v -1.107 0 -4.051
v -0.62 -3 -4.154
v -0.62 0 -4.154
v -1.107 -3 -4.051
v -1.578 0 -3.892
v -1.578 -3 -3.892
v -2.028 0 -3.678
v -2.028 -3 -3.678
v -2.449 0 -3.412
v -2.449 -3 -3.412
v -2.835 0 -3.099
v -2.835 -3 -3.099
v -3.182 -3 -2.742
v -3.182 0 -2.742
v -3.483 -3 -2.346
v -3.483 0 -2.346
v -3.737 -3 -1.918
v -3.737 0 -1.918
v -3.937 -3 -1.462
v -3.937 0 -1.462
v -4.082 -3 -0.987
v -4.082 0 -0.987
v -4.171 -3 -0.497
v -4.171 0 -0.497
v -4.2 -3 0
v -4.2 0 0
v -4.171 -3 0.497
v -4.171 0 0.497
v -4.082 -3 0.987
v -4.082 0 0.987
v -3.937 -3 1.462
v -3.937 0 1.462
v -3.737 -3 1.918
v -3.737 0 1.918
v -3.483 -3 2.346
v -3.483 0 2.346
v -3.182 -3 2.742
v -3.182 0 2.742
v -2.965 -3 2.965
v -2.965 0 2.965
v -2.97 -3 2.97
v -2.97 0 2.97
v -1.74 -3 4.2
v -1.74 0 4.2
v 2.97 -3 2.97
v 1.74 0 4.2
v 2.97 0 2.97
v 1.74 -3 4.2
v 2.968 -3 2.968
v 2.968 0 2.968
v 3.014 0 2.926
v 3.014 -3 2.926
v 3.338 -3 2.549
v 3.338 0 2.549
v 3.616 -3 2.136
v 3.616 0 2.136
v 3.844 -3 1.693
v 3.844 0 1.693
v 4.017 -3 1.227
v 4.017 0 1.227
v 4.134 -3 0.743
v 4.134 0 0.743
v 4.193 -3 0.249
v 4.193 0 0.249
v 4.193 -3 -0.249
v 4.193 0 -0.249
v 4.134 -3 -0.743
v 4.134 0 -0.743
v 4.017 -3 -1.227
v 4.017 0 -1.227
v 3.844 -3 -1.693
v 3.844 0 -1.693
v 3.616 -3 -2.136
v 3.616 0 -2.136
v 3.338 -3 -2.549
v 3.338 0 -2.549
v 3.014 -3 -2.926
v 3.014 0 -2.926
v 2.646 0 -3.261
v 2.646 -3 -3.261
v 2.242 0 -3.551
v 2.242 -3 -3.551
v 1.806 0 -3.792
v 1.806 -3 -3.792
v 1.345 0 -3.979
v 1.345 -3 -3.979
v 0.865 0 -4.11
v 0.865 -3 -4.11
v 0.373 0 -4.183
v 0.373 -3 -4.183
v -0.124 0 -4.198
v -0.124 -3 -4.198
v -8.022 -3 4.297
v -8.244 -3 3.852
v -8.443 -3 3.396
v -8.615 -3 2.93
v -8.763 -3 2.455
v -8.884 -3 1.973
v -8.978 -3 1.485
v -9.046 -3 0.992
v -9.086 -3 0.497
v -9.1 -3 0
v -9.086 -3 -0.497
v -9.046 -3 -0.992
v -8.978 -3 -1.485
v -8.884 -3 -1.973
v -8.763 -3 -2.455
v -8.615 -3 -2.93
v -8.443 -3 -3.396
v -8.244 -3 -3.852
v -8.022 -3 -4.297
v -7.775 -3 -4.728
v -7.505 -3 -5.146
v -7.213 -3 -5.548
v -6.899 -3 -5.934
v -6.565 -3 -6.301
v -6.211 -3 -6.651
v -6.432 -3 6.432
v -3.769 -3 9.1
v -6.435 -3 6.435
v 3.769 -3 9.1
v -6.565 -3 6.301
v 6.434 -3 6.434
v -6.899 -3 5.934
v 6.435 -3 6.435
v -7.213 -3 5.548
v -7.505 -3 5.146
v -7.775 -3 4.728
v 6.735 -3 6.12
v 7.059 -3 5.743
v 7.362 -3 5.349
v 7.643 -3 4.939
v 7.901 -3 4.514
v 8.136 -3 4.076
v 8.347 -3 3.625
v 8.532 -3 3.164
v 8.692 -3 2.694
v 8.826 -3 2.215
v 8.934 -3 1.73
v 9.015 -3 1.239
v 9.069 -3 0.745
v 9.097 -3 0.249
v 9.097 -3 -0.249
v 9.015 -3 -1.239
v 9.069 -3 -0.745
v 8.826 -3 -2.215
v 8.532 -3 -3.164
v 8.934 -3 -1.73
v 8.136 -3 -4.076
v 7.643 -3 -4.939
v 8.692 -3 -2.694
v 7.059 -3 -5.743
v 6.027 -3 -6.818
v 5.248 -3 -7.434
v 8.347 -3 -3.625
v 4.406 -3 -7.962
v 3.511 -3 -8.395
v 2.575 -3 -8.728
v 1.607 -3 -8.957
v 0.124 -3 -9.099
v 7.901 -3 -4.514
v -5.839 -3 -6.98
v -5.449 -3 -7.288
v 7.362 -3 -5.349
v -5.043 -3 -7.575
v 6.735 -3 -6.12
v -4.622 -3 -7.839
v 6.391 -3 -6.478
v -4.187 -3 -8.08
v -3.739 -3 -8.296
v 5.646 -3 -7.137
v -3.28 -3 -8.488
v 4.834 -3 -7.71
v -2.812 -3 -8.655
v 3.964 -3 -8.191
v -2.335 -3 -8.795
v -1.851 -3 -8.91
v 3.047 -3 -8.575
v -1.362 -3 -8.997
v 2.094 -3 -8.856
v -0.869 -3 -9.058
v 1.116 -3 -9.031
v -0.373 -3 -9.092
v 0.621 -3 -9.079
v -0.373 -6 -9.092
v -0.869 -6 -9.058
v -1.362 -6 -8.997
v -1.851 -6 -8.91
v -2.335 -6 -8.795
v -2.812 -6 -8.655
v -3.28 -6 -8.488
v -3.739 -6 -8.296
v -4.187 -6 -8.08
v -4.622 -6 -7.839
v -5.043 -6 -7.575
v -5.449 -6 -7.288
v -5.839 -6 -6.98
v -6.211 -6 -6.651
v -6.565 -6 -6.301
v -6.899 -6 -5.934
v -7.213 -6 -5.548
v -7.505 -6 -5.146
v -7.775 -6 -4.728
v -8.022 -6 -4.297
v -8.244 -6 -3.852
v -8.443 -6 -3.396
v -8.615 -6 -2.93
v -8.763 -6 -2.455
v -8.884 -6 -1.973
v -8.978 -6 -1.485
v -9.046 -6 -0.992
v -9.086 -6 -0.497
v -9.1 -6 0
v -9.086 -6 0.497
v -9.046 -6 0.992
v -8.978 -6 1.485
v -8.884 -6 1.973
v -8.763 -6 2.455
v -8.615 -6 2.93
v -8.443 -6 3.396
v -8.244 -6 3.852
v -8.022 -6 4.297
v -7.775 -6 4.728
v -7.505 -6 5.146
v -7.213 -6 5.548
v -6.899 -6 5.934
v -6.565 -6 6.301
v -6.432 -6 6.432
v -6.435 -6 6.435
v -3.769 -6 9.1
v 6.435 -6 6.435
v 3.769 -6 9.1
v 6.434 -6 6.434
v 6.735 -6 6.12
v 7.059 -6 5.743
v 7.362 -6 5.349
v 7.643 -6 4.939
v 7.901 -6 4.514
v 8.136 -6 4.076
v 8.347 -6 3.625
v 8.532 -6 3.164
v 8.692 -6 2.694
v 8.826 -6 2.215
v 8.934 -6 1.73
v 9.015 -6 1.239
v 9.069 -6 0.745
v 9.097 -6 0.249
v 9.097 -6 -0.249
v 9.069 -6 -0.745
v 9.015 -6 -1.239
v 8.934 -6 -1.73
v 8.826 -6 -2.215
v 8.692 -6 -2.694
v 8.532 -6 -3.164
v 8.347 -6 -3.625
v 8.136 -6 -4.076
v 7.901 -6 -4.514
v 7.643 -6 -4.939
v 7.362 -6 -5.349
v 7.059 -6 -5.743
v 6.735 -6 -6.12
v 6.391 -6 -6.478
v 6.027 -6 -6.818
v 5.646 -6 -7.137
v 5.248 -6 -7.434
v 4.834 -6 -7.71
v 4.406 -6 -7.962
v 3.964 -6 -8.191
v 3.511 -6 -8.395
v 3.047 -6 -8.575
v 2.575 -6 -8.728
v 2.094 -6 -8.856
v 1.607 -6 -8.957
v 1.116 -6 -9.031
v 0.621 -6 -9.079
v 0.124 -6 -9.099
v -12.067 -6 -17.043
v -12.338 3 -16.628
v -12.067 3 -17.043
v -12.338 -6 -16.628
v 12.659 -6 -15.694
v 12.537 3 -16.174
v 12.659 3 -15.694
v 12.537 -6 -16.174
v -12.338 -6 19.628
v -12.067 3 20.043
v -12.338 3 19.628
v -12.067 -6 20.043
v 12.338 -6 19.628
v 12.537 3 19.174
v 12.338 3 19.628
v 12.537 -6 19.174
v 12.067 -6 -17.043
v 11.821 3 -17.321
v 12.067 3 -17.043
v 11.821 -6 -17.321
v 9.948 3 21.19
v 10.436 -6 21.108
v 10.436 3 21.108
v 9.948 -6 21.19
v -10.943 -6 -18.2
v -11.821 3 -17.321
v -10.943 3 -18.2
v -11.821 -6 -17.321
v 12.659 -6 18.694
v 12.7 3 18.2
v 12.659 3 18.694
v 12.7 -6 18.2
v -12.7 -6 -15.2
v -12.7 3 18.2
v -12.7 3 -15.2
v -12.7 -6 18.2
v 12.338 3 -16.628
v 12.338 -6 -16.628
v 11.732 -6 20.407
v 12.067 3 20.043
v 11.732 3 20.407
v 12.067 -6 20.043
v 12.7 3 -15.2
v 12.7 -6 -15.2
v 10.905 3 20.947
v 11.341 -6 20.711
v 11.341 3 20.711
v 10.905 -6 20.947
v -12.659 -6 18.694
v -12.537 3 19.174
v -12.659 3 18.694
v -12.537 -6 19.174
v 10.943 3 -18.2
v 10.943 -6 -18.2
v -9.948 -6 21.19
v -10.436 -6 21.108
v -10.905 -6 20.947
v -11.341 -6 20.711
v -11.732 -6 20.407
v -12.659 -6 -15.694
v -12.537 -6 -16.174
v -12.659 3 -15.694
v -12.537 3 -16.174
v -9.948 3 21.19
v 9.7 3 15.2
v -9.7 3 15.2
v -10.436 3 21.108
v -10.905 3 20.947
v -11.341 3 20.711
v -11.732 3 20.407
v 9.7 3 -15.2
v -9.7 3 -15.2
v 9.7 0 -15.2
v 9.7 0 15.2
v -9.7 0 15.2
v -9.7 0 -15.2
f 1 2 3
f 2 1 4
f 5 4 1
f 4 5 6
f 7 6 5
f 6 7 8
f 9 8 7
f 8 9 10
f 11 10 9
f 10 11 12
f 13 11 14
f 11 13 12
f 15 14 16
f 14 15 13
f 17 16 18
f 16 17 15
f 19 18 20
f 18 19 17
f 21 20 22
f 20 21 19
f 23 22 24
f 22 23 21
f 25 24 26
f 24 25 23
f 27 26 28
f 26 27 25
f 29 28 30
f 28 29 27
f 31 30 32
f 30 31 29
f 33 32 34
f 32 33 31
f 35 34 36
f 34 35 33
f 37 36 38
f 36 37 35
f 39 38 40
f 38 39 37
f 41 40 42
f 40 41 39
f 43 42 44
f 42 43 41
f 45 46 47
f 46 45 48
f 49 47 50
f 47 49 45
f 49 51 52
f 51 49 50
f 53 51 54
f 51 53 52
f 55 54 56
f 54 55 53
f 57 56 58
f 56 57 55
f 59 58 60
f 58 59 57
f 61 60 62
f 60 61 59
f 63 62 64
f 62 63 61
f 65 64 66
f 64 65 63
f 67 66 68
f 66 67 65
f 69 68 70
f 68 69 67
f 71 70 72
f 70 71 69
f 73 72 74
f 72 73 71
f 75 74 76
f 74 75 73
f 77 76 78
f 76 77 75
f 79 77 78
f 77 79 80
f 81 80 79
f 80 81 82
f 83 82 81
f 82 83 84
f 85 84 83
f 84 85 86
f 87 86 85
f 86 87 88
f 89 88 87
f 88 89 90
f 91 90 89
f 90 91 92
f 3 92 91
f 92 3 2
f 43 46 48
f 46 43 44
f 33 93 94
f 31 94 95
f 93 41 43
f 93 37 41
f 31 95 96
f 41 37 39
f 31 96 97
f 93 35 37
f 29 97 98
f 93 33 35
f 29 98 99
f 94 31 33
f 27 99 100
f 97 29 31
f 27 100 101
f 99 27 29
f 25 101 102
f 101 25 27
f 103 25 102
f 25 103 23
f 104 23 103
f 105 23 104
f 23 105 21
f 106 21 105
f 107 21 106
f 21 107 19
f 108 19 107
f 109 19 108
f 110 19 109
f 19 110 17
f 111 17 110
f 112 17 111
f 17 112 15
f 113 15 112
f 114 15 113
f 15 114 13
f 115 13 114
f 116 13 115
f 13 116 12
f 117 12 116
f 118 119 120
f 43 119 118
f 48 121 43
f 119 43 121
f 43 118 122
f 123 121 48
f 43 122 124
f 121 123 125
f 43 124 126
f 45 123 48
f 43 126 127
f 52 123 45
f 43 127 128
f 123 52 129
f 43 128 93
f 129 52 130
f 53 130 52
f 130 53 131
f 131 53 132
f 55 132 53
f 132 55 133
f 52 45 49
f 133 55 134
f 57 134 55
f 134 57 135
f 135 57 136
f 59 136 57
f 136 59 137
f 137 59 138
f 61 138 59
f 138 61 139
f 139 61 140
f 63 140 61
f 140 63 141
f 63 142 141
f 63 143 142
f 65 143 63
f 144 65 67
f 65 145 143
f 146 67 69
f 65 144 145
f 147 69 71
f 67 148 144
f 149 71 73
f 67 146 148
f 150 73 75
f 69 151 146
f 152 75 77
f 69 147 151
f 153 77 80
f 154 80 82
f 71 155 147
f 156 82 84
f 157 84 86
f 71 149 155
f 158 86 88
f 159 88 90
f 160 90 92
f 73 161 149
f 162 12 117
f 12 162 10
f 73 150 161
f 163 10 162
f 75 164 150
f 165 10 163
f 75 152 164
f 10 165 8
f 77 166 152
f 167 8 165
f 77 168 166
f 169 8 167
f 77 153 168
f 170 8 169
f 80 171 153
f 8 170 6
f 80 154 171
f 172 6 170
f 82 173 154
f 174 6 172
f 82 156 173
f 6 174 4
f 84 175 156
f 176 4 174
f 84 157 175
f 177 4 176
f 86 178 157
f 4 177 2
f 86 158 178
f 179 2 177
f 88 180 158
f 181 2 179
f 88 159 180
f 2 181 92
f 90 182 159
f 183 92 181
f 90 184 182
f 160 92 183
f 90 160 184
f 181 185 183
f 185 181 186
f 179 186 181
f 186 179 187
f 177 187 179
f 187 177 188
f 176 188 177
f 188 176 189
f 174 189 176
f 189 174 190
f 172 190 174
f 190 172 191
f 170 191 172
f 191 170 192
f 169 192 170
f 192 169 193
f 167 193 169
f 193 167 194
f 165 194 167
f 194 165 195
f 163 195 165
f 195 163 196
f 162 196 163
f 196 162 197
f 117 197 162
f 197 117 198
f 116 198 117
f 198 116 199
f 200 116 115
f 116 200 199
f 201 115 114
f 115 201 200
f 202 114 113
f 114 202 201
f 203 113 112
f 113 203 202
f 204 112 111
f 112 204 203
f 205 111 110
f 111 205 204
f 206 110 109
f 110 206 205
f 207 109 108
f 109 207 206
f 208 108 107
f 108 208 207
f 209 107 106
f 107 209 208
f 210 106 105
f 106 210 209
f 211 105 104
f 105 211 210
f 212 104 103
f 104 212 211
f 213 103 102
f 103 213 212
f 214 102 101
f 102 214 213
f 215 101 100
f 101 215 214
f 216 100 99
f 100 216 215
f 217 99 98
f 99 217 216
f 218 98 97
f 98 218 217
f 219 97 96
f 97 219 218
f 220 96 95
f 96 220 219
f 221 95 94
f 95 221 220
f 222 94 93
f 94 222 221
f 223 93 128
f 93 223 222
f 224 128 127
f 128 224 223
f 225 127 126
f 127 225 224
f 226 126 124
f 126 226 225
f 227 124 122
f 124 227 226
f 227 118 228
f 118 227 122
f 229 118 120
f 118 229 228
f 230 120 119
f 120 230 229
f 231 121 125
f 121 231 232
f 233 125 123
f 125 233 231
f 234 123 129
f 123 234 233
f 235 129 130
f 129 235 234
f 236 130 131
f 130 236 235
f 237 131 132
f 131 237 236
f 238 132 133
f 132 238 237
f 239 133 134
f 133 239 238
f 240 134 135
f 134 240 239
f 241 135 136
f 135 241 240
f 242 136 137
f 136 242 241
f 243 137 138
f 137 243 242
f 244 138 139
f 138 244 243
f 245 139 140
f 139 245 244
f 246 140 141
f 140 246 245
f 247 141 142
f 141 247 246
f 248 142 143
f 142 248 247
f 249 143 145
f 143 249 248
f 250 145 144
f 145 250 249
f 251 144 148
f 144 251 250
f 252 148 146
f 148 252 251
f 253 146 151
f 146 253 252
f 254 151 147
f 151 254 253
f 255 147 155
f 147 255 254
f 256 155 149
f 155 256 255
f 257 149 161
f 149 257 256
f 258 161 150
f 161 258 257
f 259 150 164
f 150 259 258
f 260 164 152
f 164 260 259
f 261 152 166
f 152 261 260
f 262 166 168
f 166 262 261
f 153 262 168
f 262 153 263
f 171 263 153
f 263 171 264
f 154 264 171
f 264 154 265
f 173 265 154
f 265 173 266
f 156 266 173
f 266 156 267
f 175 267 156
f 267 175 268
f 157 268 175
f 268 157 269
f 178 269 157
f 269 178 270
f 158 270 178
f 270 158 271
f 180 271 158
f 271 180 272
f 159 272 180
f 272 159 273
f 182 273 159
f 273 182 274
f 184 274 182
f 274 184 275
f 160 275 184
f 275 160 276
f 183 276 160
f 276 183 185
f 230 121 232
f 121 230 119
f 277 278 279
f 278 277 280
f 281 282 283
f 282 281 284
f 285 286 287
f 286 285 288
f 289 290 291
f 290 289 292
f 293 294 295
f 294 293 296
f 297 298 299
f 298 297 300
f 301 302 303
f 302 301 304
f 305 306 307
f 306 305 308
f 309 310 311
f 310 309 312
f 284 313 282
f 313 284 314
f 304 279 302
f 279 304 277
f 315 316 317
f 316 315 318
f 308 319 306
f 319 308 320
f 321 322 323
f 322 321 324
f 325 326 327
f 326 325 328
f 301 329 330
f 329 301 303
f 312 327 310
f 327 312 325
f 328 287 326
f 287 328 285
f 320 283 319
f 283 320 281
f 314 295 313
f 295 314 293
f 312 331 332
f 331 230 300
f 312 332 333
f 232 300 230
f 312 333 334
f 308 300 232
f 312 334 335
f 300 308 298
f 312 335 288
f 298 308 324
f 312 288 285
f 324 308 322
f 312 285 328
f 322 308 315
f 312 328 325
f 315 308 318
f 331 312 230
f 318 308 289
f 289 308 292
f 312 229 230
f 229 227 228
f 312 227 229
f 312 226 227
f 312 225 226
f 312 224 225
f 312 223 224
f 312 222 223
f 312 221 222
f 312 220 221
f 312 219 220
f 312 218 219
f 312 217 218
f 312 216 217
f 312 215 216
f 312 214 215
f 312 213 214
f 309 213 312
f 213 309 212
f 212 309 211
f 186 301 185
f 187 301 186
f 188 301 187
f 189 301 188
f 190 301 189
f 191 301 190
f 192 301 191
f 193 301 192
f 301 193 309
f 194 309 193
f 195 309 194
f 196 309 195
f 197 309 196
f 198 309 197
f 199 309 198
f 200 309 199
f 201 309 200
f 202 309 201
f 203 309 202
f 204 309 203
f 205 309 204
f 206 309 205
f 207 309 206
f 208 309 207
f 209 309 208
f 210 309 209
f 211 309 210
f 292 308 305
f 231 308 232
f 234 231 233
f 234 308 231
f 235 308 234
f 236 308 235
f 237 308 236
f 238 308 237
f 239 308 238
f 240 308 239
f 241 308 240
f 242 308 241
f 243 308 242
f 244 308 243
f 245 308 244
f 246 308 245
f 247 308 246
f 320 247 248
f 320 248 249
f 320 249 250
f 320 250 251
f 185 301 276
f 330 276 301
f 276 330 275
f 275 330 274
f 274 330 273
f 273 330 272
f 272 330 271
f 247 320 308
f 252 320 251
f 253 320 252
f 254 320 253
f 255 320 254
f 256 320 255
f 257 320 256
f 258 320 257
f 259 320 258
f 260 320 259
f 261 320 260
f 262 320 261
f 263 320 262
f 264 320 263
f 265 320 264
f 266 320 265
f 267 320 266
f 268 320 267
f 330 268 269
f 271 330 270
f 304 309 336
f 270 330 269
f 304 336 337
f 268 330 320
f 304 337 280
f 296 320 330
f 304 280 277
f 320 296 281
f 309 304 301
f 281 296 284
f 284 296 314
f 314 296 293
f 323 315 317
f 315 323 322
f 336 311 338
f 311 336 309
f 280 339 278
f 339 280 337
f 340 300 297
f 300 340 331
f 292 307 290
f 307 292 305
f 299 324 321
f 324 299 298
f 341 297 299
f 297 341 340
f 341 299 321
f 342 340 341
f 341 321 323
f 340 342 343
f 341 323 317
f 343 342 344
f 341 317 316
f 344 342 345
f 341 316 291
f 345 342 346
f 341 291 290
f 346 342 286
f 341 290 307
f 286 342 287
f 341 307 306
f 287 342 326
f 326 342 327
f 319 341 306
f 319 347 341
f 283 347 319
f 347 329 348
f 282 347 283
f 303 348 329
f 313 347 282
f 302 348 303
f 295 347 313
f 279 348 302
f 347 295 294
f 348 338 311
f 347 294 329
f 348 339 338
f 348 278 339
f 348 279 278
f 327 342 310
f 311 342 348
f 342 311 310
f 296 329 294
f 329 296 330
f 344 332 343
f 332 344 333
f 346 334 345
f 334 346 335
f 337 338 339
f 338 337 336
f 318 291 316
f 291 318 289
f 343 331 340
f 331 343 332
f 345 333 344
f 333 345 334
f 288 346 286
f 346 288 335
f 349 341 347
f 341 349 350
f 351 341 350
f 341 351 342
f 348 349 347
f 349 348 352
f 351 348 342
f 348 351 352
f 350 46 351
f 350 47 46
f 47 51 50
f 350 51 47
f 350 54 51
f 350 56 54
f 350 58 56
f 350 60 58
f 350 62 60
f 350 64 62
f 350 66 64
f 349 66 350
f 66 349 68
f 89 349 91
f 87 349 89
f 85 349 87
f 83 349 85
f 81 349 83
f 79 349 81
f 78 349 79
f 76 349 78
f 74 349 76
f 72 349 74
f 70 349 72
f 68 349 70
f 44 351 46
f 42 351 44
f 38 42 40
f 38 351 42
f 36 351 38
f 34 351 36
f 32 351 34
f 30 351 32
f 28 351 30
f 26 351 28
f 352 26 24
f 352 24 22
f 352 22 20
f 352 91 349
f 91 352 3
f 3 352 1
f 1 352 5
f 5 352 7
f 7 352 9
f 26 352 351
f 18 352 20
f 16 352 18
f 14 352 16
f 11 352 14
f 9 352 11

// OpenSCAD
// file: functions.scad
/*******************************************************************

This OpenSCAD code and its rendered 3D model are part of the

	Kühling&Kühling RepRap Industrial 3D Printer


All details, BOM, assembling instructions and latest sources:
	http://kuehlingkuehling.de

Designed and developed by:
	Jonas Kühling <mail@jonaskuehling.de>
	Simon Kühling <mail@simonkuehling.de>

License:
	Creative Commons Attribution-ShareAlike 4.0 International (CC BY-SA 4.0)
	https://creativecommons.org/licenses/by-sa/4.0/

*******************************************************************/

module teardrop (r=4.5,h=20,alpha=45,teardropcorner=0,fulldrop=0){		// tear drop hole for top-centering
											// use teardropcorner=1 for bottom horizontal corners
	render()
	translate([-h/2,0,0])
		rotate([-270,0+(teardropcorner*180),90])
			difference(){
				linear_extrude(height=h){
					circle(r);
					polygon(points=[[0,0],[r*cos(alpha),r*sin(alpha)],[0,r/sin(alpha)],[-r*cos(alpha),r*sin(alpha)]], paths=[[0,1,2,3]]);
				}
				if(fulldrop==0) 
					translate([0,(r/sin(alpha))/2+r,h/2]) cube([2*r+2,r/sin(alpha),h+2],center=true);
			}
}

//teardrop(4.5,22,fulldrop=true);



module teardropcentering (r=4.5,h=20,alpha=45){				// tear drop hole for top-centering
	centering_offset_factor = 1.1;
	render()
	translate([-h/2,0,0])
		rotate([-270,0,90])
			difference(){
				linear_extrude(height=h){
					circle(r, $fn=24);
					polygon(points=[[0,0],[r*cos(alpha),r*sin(alpha)],[0,r/sin(alpha)],[-r*cos(alpha),r*sin(alpha)]], paths=[[0,1,2,3]]);
				}
				translate([0,(r/sin(alpha))/2+r*centering_offset_factor,h/2]) cube([2*r+2,r/sin(alpha),h+2],center=true);
			}
}

//teardropcentering();



module teardropcentering_half (r=4.5,h=20, bottom=0,alpha=45){				// tear drop hole for top-centering
																// upper half (bottom=0) or bottom half (bottom=1)
	centering_offset_factor = 1.2;
	render()
	translate([-h/2,0,0])
		rotate([-270,0,90])
			difference(){
				linear_extrude(height=h){
					circle(r, $fn=24);
					polygon(points=[[0,0],[r*cos(alpha),r*sin(alpha)],[0,r/sin(alpha)],[-r*cos(alpha),r*sin(alpha)]], paths=[[0,1,2,3]]);
				}
				translate([0,(r/sin(alpha))/2+r*centering_offset_factor,h/2]) cube([2*r+2,r/sin(alpha),h+2],center=true);
				translate([0,-(r*centering_offset_factor)/2-0.5+bottom*(r*centering_offset_factor+1),h/2]) cube([2*r+2,r*centering_offset_factor+1,h+2],center=true);
			}
}

//teardropcentering_half(bottom=0);


module polyhole(d,h){
	n = max(round(2 * d),3);
	cylinder(h = h, r = (d / 2) / cos (180 / n), $fn = n, center=true);
}



module roundcorner(radius,edge_length){
	render()
	translate([0,0,-1])
		difference(){
			translate([-1,-1,0])
				cube(size = [radius+1,radius+1,edge_length+2], center = false);
			translate(v = [radius,radius,-1])
				cylinder(h = edge_length+4, r=radius, center=false,$fs=0.1);
		}
}

//roundcorner(5,5);



module roundcorner_tear(radius,edge_length){
	render()
	difference(){
		translate([-1,-1,-1])
			cube(size = [edge_length+2, radius+1, radius+1], center = false);
		translate([(edge_length+4)/2-2, radius, radius])
			teardrop(radius, edge_length+4,teardropcorner=1);
	}
}

//roundcorner_tear(8,20);


module roundedge_tear(radius){
	render()
	difference(){
		translate([-1,-1,-1])
			cube(size = [radius+1, radius+1, radius+1], center = false);
		translate([radius,radius,radius])
			union(){
				sphere(r=radius, $fs=0.1);
				translate([0,0,-radius])
					cylinder(r1=(radius*sin(45))-(radius-(radius*sin(45))),r2=radius*sin(45),h=(radius-(radius*sin(45))), $fs=0.1);
			}
	}
}

//roundedge_tear(20);



module roundedge(radius){
	render()
	difference(){
		translate([-1,-1,-1])
			cube(size = [radius+1, radius+1, radius+1], center = false);
		translate([radius,radius,radius])
			sphere(r=radius, $fs=0.1);
	}
}

//roundedge(5);


module nut_trap(nut_wrench_size,trap_height,vertical=0, clearance=0.2,center=true){		// M3 wrench size = 5.5
	radius = cornerdiameter(nut_wrench_size+2*clearance) /2;
	rotate([0,vertical*90,0])
		cylinder(h = trap_height, r = radius, center=center, $fn = 6);
}

module nut_trap_square(nut_wrench_size,trap_height,vertical=0, clearance=0.2,center=true){		// M3 wrench size = 5.5
	rotate([0,vertical*90,0])
		cube([nut_wrench_size+2*clearance,nut_wrench_size+2*clearance,trap_height],center=center);
}

//nut_trap_square(5,5,0);

module nut_slot(nut_wrench_size,nut_height, nut_elevation,vertical=0, clearance=0.2){		// M3 wrench size = 5.5
	radius = cornerdiameter(nut_wrench_size+2*clearance) /2;
	slot_height = nut_height+2*clearance;
	slot_width = nut_wrench_size+2*clearance;
	rotate([0,vertical*270,0]){
		cylinder(h = slot_height, r = radius, center=true, $fn = 6);
		translate([0,-slot_width/2,-slot_height/2]) cube([nut_elevation+1,slot_width,slot_height]);
	}
}

module nut_slot_square(nut_wrench_size,nut_height, nut_elevation,vertical=0, clearance=0.2){		// M3 wrench size = 5.5
	slot_height = nut_height+2*clearance;
	slot_width = nut_wrench_size+2*clearance;
	rotate([0,vertical*270,0]){
		cube([slot_width,slot_width,slot_height],center=true);
		translate([0,-slot_width/2,-slot_height/2]) cube([nut_elevation+1,slot_width,slot_height]);
	}
}

//nut_slot_square(5.5,3,4,1);

function cornerdiameter(wrench_size) =  2* ((wrench_size)/2)/ cos(180/6);
function cornerdiameter_8(wrench_size) =  2* ((wrench_size)/2)/ cos(180/8);
function cornerdiameter_4(wrench_size) =  2* ((wrench_size)/2)/ cos(180/4);
// main file
/*******************************************************************

This OpenSCAD code and its rendered 3D model are part of the

	Kühling&Kühling RepRap Industrial 3D Printer


All details, BOM, assembling instructions and latest sources:
	http://kuehlingkuehling.de

Designed and developed by:
	Jonas Kühling <mail@jonaskuehling.de>
	Simon Kühling <mail@simonkuehling.de>

License:
	Creative Commons Attribution-ShareAlike 4.0 International (CC BY-SA 4.0)
	https://creativecommons.org/licenses/by-sa/4.0/

*******************************************************************/

include <configuration.scad>



// RENDERING
spool_mount_endcap();




module spool_mount_endcap(){
	difference(){

		// main body
		hull(){
			translate([spool_mount_endcap_body_width/2-wall,-(spool_mount_endcap_body_length)/2+wall,-frame_width/2-clearance-wall+wall])
				rotate([0,0,90])
					rotate([180,0,0])
						teardrop(wall,spool_mount_endcap_body_length);
			translate([-spool_mount_endcap_body_width/2+wall,-(spool_mount_endcap_body_length)/2+wall,-frame_width/2-clearance-wall+wall])
				rotate([0,0,90])
					rotate([180,0,0])
						teardrop(wall,spool_mount_endcap_body_length);
			translate([spool_mount_endcap_body_width/2-wall,-(spool_mount_endcap_body_length)/2+wall,-frame_width/2-clearance-wall+spool_mount_endcap_body_height-wall])
				rotate([0,0,90])
					rotate([180,0,0])
						teardrop(wall,spool_mount_endcap_body_length);
			translate([-spool_mount_endcap_body_width/2+wall,-(spool_mount_endcap_body_length)/2+wall,-frame_width/2-clearance-wall+spool_mount_endcap_body_height-wall])
				rotate([0,0,90])
					rotate([180,0,0])
						teardrop(wall,spool_mount_endcap_body_length);
		}

		// extrusion center mount hole
		translate([0,-(spool_mount_endcap_body_length)/2+wall,0])
			rotate([0,0,90])
				teardrop(frame_center_screw_dia/2+clearance,spool_mount_endcap_body_length+2);
		translate([0,-(spool_mount_endcap_body_length)/2+wall-spool_mount_endcap_body_length+wall,0])
			rotate([0,0,90])
				teardrop(frame_center_screw_washer_dia/2+clearance,spool_mount_endcap_body_length);

		// extrusion clearance
		translate([-(frame_width_small+2*clearance)/2,0,-(frame_width+2*clearance)/2])
			cube([frame_width_small+2*clearance,spool_mount_endcap_body_length,frame_width+2*clearance]);

		// frame mount screw holes
*		for(i=[0,1])
			mirror([0,i,0])
				translate([(2*wall+1)/2-1,filament_spool_mount_dia/2-wall/2+clearance+frame_screw_washer_dia/2,frame_width/2])
					teardrop(frame_screw_dia/2+clearance,2*wall+2);


	}
}
